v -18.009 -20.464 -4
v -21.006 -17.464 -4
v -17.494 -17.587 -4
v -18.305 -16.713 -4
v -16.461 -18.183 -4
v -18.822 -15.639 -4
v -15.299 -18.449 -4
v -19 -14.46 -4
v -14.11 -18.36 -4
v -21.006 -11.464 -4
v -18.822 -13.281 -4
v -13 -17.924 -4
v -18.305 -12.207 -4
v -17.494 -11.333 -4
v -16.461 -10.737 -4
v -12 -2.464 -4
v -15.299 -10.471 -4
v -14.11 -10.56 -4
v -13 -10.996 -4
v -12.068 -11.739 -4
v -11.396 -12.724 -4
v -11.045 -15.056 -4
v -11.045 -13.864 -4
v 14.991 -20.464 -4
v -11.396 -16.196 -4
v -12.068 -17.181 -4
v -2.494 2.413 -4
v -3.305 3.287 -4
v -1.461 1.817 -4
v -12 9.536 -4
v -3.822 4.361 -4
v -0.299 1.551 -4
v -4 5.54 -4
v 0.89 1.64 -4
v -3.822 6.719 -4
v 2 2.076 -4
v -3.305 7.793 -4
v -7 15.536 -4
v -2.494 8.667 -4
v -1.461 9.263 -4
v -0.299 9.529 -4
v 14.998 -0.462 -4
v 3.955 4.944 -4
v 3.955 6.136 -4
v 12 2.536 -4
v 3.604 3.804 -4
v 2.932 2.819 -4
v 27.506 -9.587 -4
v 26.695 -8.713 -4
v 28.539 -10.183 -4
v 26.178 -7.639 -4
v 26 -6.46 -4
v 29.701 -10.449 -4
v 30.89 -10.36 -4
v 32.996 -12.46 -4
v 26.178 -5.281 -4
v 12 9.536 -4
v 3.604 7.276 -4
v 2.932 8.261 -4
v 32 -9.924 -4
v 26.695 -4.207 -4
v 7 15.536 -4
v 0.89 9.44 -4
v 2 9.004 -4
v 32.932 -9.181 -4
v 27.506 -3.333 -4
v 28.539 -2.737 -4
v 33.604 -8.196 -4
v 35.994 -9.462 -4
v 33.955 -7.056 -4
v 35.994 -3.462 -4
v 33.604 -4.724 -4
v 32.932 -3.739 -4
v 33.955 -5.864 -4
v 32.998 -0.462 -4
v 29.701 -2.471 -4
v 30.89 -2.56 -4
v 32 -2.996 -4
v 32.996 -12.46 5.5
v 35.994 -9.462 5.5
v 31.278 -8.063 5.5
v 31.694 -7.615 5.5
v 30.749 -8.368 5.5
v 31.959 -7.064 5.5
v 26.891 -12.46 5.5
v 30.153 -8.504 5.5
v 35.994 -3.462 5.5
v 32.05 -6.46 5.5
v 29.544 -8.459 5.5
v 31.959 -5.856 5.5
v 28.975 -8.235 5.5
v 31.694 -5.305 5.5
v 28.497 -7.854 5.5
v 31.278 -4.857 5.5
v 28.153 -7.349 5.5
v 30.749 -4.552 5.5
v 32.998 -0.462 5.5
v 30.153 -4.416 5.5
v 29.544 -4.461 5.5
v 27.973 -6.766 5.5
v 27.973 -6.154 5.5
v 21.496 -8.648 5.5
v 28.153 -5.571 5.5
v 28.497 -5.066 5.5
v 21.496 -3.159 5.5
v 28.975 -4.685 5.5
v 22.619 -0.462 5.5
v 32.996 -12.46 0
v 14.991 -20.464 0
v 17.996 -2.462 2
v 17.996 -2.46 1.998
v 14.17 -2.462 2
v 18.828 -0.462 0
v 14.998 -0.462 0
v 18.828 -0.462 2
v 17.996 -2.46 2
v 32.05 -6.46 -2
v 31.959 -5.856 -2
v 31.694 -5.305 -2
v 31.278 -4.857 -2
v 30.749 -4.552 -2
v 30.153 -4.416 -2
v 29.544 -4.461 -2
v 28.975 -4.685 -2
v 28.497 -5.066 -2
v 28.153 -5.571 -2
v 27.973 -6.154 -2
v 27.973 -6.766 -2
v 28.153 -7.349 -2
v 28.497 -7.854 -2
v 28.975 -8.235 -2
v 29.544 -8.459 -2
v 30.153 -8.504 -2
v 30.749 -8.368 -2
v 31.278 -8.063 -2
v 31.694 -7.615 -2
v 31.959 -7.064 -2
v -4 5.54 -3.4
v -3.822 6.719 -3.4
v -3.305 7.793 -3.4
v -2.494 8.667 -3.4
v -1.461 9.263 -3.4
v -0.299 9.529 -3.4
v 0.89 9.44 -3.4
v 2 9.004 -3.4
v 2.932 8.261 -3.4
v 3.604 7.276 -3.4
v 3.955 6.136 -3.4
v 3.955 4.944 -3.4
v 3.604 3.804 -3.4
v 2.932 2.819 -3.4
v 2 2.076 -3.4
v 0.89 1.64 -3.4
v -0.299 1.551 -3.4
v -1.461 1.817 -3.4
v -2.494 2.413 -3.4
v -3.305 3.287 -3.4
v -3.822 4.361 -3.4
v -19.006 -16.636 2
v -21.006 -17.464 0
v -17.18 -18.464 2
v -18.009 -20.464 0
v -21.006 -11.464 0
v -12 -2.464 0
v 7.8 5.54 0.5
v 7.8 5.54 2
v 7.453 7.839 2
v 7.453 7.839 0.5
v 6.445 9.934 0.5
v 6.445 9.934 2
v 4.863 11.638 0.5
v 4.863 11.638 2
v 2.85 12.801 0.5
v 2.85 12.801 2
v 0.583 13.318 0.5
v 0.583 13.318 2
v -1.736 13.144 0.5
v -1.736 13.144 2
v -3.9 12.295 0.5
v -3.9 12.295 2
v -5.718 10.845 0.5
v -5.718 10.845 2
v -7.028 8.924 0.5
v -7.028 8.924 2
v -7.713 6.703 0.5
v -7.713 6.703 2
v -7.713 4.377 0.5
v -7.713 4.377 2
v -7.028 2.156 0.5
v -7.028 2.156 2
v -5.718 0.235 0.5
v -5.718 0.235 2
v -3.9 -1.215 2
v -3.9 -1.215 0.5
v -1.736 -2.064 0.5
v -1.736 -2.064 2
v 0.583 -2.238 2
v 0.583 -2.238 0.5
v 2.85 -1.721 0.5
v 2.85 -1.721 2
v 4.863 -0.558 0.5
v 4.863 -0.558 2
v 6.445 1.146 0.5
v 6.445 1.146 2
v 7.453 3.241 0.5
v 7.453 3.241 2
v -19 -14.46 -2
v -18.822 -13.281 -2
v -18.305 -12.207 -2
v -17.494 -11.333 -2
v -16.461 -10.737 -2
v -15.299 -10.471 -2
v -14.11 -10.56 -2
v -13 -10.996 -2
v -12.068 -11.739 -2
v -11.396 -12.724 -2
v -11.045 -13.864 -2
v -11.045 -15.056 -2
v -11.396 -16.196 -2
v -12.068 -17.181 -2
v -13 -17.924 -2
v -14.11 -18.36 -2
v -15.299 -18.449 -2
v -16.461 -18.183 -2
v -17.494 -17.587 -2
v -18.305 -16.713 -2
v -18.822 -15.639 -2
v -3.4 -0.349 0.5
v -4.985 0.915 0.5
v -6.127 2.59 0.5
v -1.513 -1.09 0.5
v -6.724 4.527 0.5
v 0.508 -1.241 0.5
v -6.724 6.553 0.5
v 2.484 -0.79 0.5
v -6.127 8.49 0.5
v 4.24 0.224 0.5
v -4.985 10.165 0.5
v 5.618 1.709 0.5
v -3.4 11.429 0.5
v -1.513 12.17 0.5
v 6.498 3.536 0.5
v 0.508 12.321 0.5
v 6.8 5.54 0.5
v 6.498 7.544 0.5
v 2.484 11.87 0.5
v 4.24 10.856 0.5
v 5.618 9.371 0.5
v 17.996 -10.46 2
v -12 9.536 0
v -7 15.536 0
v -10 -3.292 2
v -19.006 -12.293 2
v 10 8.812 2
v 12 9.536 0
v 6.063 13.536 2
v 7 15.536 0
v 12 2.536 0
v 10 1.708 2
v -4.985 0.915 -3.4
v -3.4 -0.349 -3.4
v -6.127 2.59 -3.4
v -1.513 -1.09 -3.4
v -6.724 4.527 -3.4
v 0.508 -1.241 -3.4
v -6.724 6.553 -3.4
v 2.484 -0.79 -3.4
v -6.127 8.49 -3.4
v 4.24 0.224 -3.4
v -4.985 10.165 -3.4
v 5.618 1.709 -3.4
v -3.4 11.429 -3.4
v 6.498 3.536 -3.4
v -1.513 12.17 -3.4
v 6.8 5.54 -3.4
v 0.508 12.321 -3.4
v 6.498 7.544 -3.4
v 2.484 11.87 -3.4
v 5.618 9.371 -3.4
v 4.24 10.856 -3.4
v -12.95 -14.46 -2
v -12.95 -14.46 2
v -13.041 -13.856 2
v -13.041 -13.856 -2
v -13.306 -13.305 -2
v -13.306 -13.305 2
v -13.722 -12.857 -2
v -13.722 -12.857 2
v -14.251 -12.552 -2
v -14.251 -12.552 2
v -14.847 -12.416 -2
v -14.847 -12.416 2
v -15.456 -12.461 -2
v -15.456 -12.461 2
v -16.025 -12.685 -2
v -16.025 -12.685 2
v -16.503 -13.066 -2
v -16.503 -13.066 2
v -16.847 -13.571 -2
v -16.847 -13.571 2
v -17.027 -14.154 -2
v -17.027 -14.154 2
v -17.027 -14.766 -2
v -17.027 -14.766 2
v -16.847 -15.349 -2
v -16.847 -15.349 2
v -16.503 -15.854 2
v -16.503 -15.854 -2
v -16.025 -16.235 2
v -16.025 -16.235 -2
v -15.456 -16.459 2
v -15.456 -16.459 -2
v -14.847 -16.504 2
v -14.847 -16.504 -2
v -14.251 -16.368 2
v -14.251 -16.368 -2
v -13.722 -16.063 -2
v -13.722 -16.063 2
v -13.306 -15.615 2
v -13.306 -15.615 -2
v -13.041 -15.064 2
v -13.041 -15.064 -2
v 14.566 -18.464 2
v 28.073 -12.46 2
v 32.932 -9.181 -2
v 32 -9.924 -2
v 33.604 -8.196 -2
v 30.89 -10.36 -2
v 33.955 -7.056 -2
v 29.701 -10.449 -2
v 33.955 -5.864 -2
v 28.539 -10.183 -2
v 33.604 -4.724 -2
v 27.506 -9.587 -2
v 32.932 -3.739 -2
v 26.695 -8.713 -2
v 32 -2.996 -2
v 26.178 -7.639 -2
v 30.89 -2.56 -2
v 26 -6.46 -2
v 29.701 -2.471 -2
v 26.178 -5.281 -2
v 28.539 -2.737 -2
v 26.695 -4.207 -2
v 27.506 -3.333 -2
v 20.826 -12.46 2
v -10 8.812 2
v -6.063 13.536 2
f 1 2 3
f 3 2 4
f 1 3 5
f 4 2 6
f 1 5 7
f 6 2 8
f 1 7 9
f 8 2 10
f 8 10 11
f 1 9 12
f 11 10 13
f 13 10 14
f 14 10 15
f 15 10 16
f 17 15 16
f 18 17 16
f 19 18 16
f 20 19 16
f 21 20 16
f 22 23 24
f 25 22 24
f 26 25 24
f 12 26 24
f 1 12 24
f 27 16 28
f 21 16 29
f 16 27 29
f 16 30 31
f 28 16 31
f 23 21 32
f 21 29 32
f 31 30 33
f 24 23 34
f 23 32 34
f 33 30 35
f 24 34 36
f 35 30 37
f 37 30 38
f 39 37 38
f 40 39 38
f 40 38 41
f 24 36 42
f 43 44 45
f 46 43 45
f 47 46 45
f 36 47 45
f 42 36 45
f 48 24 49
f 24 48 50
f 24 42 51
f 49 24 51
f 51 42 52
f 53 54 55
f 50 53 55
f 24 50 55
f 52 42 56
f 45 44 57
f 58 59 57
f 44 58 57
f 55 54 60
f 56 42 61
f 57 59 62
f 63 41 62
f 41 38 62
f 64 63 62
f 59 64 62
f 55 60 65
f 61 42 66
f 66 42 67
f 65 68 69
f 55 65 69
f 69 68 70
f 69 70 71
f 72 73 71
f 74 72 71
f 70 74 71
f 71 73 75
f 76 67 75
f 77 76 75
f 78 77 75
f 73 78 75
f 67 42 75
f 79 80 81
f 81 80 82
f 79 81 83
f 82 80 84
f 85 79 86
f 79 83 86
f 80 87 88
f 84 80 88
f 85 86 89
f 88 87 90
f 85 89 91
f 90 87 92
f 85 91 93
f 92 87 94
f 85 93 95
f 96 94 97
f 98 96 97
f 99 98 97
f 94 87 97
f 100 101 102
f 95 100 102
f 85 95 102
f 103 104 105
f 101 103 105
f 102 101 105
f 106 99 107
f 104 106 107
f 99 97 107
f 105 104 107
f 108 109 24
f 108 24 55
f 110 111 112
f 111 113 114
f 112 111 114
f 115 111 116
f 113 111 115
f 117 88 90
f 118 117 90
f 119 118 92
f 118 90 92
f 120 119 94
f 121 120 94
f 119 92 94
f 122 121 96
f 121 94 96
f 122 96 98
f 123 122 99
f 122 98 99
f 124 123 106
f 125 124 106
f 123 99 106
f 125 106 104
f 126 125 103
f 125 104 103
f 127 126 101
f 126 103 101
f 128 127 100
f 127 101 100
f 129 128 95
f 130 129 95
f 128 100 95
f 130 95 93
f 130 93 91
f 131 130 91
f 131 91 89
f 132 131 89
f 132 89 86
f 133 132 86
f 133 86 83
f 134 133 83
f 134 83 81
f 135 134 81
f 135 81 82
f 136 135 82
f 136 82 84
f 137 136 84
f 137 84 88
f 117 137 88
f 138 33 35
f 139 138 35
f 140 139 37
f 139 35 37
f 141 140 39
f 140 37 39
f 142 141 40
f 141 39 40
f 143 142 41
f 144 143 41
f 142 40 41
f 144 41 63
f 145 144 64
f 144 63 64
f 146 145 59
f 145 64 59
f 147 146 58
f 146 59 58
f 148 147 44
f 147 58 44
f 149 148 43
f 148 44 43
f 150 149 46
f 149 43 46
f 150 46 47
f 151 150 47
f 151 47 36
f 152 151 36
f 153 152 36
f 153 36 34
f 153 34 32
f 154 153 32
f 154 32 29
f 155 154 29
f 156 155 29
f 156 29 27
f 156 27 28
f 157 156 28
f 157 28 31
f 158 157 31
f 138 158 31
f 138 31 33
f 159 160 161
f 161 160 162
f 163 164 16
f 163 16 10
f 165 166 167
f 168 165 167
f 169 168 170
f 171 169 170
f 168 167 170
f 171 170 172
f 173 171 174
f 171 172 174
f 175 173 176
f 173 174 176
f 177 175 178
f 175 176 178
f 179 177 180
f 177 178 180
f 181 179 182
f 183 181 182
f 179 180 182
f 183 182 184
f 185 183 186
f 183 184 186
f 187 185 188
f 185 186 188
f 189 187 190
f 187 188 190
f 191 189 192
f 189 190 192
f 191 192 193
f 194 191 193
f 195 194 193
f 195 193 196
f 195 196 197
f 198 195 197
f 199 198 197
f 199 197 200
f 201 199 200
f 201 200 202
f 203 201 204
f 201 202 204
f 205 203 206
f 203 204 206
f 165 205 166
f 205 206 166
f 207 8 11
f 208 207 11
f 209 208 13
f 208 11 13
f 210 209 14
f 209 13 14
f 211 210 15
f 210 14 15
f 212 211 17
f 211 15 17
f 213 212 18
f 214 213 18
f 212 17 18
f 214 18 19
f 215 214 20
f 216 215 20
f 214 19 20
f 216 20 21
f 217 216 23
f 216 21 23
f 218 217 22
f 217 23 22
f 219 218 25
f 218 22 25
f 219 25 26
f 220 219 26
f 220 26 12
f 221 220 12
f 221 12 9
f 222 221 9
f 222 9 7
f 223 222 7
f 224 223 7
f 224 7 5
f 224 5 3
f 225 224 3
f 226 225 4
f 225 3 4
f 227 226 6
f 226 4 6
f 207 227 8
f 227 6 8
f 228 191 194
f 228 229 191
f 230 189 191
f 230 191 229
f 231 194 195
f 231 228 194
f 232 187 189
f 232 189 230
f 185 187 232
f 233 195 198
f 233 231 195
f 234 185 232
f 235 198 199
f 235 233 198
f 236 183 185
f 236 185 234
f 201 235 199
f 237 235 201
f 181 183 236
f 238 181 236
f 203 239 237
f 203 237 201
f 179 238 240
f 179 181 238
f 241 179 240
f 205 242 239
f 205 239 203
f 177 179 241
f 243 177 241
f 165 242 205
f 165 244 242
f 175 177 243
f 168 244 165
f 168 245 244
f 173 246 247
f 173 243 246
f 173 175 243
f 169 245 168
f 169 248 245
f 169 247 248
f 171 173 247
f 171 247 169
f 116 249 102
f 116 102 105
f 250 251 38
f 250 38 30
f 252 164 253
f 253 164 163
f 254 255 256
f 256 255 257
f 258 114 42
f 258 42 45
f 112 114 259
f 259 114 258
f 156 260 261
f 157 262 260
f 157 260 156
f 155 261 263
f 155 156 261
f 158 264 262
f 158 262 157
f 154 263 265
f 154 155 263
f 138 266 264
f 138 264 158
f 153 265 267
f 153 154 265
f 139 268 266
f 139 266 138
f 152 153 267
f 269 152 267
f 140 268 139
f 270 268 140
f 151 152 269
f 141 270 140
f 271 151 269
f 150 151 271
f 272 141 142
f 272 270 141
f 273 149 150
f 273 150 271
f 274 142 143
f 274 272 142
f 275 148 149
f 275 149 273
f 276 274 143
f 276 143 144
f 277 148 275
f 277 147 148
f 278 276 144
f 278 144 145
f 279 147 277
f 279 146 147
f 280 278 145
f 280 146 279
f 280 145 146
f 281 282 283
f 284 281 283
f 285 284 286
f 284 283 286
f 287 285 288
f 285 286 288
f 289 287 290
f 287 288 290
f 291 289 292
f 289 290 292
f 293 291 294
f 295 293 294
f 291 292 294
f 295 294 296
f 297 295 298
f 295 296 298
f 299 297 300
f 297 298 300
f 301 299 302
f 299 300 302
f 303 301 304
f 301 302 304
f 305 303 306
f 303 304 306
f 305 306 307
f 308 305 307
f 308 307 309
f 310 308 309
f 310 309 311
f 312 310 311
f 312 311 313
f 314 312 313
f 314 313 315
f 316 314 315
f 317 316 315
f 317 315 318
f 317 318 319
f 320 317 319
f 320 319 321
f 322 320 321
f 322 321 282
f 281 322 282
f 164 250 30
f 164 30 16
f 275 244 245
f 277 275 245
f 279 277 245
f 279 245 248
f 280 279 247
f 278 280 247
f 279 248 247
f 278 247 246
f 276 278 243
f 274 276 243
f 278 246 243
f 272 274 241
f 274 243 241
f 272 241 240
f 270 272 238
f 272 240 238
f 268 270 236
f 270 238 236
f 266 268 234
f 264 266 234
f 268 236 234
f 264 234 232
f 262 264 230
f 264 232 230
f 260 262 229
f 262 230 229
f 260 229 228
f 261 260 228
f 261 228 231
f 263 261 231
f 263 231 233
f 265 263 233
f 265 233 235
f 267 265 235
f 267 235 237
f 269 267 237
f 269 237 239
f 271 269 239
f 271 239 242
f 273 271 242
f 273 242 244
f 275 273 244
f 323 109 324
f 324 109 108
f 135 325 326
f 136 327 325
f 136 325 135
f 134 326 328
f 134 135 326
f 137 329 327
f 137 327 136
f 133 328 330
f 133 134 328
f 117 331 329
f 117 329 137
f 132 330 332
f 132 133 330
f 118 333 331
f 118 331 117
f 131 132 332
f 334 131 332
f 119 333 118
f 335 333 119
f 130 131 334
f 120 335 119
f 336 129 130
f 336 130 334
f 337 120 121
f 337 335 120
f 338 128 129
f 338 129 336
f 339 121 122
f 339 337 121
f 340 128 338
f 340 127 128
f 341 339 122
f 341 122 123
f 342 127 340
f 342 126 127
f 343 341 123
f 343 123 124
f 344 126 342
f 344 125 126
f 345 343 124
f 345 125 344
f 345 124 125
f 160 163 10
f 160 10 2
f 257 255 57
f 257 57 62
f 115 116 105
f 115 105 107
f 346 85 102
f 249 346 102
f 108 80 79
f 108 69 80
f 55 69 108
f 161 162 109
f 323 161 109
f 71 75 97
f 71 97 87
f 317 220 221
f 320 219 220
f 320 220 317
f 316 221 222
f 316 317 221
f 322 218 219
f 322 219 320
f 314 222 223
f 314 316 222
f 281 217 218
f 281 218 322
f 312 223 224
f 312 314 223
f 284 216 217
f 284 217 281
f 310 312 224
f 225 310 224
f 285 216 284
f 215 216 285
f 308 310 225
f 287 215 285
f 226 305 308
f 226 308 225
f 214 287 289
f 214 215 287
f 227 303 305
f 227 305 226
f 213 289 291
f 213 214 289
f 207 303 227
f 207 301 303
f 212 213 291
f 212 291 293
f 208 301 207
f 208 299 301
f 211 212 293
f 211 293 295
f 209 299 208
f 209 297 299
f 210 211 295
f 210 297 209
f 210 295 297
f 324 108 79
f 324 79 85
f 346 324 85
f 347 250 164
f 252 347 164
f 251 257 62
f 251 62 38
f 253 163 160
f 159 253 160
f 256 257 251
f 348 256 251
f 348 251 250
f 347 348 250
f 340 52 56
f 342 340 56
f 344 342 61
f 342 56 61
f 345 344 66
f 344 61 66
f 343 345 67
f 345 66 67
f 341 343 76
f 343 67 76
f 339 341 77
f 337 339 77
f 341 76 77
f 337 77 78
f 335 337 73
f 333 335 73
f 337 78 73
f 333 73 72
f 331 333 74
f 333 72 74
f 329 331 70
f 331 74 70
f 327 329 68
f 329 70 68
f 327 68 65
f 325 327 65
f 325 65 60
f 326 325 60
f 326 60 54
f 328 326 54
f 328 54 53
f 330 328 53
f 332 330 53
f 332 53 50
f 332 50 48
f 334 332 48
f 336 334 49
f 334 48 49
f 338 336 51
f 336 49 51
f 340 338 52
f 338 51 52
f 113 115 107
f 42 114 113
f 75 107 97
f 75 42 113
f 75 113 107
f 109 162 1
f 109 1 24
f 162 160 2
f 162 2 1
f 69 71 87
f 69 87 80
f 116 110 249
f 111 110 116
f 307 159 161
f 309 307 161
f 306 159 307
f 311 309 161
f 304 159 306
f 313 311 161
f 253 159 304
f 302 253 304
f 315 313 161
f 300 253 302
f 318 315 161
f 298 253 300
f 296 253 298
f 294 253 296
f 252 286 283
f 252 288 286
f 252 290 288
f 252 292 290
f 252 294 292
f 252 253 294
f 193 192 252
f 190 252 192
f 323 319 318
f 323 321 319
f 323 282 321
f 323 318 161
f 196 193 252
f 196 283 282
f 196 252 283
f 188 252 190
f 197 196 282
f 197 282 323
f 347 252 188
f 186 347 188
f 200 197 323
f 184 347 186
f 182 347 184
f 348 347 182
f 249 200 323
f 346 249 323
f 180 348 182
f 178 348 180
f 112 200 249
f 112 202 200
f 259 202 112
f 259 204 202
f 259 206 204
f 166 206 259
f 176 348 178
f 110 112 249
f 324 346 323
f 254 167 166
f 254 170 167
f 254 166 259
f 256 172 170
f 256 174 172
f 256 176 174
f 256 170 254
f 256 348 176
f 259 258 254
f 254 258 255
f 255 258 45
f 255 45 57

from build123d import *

# Parameters (mm, degrees)
BOSS_EXTRUDE1_DEPTH = 4
BOSS_EXTRUDE2_DEPTH = 2
BOSS_EXTRUDE2_DRAFT = 45
BOSS_EXTRUDE3_DEPTH = 5.5
SKETCH6_R           = 4
CUT_EXTRUDE1_DEPTH  = 18.5
SKETCH7_R           = 6.8
CUT_EXTRUDE2_DEPTH  = 5.4
SKETCH8_R           = 7.8
CUT_EXTRUDE3_DEPTH  = 1.5
SKETCH9_R           = 2.05
CUT_EXTRUDE4_DEPTH  = 15.5
SKETCH10_R          = 4
CUT_EXTRUDE5_DEPTH  = 2
SKETCH11_R          = 4
CUT_EXTRUDE6_DEPTH  = 2
CHAMFER4_SIZE       = 3.5


with BuildPart() as part:
    # Sketch1 → Boss-Extrude1 (new body)
    with BuildSketch(Plane.XY):
        Polygon((7, 15.536167626), (-7, 15.536167626), (-12, 9.536492635), (-12, -2.463507365), (-21.005602907, -11.463832374), (-21.005602907, -17.463832374), (-18.009338566, -20.463832374), (14.990661434, -20.463832374), (32.996264341, -12.45977287), (35.994397093, -9.461640117), (35.994397093, -3.461640117), (32.998132752, -0.461640117), (14.998132752, -0.461640117), (12, 2.536492635), (12, 9.536492635), align=None)
    extrude(amount=-BOSS_EXTRUDE1_DEPTH)


with BuildPart() as boss_extrude2_tool:
    # Sketch2 → Boss-Extrude2 (with draft: the straight prism first)
    with BuildSketch(Plane.XY):
        Polygon((7, 15.536167626), (-7, 15.536167626), (-12, 9.536492635), (-12, -2.463507365), (-21.005602907, -11.463832374), (-21.005602907, -17.463832374), (-18.009338566, -20.463832374), (14.990661434, -20.463832374), (32.996264341, -12.45977287), (35.994397093, -9.461640117), (35.994397093, -3.461640117), (32.998132752, -0.461640117), (14.998132752, -0.461640117), (12, 2.536492635), (12, 9.536492635), align=None)
    extrude(amount=BOSS_EXTRUDE2_DEPTH)
    # Boss-Extrude2: the draft: its side faces are tilted about the plane it starts from
    boss_extrude2_sides = [boss_extrude2_tool.faces().sort_by_distance(p)[0] for p in [
        (0, 15.536167626, 1),
        (-9.5, 12.536330131, 1),
        (-12, 3.536492635, 1),
        (-16.502801453, -6.963669869, 1),
        (-21.005602907, -14.463832374, 1),
        (-19.507470737, -18.963832374, 1),
        (-1.509338566, -20.463832374, 1),
        (23.993462887, -16.461802622, 1),
        (34.495330717, -10.960706493, 1),
        (35.994397093, -6.461640117, 1),
        (34.496264923, -1.961640117, 1),
        (23.998132752, -0.461640117, 1),
        (13.499066376, 1.037426259, 1),
        (12, 6.036492635, 1),
        (9.5, 12.536330131, 1),
    ]]
    draft(boss_extrude2_sides, Plane.XY, BOSS_EXTRUDE2_DRAFT)


with BuildPart() as part_1:
    add(part.part)

    # Boss-Extrude2: add boss_extrude2_tool
    add(boss_extrude2_tool.part)

    # Sketch4 → Boss-Extrude3 (add)
    with BuildSketch(Plane.XY):
        Polygon((32.996264341, -12.45977287), (20.826264341, -12.45977287), (17.996264341, -10.45977287), (17.996264341, -2.45977287), (18.828132752, -0.461640117), (32.998132752, -0.461640117), (35.994397093, -3.461640117), (35.994397093, -9.461640117), align=None)
    extrude(amount=BOSS_EXTRUDE3_DEPTH)

    # Sketch6 → Cut-Extrude1 (cut)
    with BuildSketch(Plane(origin=(0, 0, -4), x_dir=(-1, 0, 0), z_dir=(0, 0, -1))):
        with Locations((0, 5.54)):
            Circle(SKETCH6_R)
    extrude(amount=-CUT_EXTRUDE1_DEPTH, mode=Mode.SUBTRACT)

    # Sketch7 → Cut-Extrude2 (cut)
    with BuildSketch(Plane.XY.offset(2)):
        with Locations((0, 5.54)):
            Circle(SKETCH7_R)
    extrude(amount=-CUT_EXTRUDE2_DEPTH, mode=Mode.SUBTRACT)

    # Sketch8 → Cut-Extrude3 (cut)
    with BuildSketch(Plane.XY.offset(2)):
        with Locations((0, 5.54)):
            Circle(SKETCH8_R)
    extrude(amount=-CUT_EXTRUDE3_DEPTH, mode=Mode.SUBTRACT)

    # Sketch9 → Cut-Extrude4 (cut)
    with BuildSketch(Plane.XY.offset(5.5)):
        with Locations((-15, -14.46)):
            Circle(SKETCH9_R)
        with Locations((30, -6.46)):
            Circle(SKETCH9_R)
    extrude(amount=-CUT_EXTRUDE4_DEPTH, mode=Mode.SUBTRACT)

    # Sketch10 → Cut-Extrude5 (cut)
    with BuildSketch(Plane(origin=(0, 0, -4), x_dir=(-1, 0, 0), z_dir=(0, 0, -1))):
        with Locations((15, -14.46)):
            Circle(SKETCH10_R)
    extrude(amount=-CUT_EXTRUDE5_DEPTH, mode=Mode.SUBTRACT)

    # Sketch11 → Cut-Extrude6 (cut)
    with BuildSketch(Plane(origin=(0, 0, -4), x_dir=(-1, 0, 0), z_dir=(0, 0, -1))):
        with Locations((-30, -6.46)):
            Circle(SKETCH11_R)
    extrude(amount=-CUT_EXTRUDE6_DEPTH, mode=Mode.SUBTRACT)

    # Chamfer4
    chamfer4_edges = [part_1.edges().sort_by_distance(p)[0] for p in [
        (19.411264341, -11.45977287, 5.5),
        (18.412198547, -1.460706493, 5.5),
        (17.996264341, -6.45977287, 5.5),
    ]]
    chamfer(chamfer4_edges, length=CHAMFER4_SIZE - 0.0001)  # a hair under: the kernel refuses the full size


solid = part_1.part
